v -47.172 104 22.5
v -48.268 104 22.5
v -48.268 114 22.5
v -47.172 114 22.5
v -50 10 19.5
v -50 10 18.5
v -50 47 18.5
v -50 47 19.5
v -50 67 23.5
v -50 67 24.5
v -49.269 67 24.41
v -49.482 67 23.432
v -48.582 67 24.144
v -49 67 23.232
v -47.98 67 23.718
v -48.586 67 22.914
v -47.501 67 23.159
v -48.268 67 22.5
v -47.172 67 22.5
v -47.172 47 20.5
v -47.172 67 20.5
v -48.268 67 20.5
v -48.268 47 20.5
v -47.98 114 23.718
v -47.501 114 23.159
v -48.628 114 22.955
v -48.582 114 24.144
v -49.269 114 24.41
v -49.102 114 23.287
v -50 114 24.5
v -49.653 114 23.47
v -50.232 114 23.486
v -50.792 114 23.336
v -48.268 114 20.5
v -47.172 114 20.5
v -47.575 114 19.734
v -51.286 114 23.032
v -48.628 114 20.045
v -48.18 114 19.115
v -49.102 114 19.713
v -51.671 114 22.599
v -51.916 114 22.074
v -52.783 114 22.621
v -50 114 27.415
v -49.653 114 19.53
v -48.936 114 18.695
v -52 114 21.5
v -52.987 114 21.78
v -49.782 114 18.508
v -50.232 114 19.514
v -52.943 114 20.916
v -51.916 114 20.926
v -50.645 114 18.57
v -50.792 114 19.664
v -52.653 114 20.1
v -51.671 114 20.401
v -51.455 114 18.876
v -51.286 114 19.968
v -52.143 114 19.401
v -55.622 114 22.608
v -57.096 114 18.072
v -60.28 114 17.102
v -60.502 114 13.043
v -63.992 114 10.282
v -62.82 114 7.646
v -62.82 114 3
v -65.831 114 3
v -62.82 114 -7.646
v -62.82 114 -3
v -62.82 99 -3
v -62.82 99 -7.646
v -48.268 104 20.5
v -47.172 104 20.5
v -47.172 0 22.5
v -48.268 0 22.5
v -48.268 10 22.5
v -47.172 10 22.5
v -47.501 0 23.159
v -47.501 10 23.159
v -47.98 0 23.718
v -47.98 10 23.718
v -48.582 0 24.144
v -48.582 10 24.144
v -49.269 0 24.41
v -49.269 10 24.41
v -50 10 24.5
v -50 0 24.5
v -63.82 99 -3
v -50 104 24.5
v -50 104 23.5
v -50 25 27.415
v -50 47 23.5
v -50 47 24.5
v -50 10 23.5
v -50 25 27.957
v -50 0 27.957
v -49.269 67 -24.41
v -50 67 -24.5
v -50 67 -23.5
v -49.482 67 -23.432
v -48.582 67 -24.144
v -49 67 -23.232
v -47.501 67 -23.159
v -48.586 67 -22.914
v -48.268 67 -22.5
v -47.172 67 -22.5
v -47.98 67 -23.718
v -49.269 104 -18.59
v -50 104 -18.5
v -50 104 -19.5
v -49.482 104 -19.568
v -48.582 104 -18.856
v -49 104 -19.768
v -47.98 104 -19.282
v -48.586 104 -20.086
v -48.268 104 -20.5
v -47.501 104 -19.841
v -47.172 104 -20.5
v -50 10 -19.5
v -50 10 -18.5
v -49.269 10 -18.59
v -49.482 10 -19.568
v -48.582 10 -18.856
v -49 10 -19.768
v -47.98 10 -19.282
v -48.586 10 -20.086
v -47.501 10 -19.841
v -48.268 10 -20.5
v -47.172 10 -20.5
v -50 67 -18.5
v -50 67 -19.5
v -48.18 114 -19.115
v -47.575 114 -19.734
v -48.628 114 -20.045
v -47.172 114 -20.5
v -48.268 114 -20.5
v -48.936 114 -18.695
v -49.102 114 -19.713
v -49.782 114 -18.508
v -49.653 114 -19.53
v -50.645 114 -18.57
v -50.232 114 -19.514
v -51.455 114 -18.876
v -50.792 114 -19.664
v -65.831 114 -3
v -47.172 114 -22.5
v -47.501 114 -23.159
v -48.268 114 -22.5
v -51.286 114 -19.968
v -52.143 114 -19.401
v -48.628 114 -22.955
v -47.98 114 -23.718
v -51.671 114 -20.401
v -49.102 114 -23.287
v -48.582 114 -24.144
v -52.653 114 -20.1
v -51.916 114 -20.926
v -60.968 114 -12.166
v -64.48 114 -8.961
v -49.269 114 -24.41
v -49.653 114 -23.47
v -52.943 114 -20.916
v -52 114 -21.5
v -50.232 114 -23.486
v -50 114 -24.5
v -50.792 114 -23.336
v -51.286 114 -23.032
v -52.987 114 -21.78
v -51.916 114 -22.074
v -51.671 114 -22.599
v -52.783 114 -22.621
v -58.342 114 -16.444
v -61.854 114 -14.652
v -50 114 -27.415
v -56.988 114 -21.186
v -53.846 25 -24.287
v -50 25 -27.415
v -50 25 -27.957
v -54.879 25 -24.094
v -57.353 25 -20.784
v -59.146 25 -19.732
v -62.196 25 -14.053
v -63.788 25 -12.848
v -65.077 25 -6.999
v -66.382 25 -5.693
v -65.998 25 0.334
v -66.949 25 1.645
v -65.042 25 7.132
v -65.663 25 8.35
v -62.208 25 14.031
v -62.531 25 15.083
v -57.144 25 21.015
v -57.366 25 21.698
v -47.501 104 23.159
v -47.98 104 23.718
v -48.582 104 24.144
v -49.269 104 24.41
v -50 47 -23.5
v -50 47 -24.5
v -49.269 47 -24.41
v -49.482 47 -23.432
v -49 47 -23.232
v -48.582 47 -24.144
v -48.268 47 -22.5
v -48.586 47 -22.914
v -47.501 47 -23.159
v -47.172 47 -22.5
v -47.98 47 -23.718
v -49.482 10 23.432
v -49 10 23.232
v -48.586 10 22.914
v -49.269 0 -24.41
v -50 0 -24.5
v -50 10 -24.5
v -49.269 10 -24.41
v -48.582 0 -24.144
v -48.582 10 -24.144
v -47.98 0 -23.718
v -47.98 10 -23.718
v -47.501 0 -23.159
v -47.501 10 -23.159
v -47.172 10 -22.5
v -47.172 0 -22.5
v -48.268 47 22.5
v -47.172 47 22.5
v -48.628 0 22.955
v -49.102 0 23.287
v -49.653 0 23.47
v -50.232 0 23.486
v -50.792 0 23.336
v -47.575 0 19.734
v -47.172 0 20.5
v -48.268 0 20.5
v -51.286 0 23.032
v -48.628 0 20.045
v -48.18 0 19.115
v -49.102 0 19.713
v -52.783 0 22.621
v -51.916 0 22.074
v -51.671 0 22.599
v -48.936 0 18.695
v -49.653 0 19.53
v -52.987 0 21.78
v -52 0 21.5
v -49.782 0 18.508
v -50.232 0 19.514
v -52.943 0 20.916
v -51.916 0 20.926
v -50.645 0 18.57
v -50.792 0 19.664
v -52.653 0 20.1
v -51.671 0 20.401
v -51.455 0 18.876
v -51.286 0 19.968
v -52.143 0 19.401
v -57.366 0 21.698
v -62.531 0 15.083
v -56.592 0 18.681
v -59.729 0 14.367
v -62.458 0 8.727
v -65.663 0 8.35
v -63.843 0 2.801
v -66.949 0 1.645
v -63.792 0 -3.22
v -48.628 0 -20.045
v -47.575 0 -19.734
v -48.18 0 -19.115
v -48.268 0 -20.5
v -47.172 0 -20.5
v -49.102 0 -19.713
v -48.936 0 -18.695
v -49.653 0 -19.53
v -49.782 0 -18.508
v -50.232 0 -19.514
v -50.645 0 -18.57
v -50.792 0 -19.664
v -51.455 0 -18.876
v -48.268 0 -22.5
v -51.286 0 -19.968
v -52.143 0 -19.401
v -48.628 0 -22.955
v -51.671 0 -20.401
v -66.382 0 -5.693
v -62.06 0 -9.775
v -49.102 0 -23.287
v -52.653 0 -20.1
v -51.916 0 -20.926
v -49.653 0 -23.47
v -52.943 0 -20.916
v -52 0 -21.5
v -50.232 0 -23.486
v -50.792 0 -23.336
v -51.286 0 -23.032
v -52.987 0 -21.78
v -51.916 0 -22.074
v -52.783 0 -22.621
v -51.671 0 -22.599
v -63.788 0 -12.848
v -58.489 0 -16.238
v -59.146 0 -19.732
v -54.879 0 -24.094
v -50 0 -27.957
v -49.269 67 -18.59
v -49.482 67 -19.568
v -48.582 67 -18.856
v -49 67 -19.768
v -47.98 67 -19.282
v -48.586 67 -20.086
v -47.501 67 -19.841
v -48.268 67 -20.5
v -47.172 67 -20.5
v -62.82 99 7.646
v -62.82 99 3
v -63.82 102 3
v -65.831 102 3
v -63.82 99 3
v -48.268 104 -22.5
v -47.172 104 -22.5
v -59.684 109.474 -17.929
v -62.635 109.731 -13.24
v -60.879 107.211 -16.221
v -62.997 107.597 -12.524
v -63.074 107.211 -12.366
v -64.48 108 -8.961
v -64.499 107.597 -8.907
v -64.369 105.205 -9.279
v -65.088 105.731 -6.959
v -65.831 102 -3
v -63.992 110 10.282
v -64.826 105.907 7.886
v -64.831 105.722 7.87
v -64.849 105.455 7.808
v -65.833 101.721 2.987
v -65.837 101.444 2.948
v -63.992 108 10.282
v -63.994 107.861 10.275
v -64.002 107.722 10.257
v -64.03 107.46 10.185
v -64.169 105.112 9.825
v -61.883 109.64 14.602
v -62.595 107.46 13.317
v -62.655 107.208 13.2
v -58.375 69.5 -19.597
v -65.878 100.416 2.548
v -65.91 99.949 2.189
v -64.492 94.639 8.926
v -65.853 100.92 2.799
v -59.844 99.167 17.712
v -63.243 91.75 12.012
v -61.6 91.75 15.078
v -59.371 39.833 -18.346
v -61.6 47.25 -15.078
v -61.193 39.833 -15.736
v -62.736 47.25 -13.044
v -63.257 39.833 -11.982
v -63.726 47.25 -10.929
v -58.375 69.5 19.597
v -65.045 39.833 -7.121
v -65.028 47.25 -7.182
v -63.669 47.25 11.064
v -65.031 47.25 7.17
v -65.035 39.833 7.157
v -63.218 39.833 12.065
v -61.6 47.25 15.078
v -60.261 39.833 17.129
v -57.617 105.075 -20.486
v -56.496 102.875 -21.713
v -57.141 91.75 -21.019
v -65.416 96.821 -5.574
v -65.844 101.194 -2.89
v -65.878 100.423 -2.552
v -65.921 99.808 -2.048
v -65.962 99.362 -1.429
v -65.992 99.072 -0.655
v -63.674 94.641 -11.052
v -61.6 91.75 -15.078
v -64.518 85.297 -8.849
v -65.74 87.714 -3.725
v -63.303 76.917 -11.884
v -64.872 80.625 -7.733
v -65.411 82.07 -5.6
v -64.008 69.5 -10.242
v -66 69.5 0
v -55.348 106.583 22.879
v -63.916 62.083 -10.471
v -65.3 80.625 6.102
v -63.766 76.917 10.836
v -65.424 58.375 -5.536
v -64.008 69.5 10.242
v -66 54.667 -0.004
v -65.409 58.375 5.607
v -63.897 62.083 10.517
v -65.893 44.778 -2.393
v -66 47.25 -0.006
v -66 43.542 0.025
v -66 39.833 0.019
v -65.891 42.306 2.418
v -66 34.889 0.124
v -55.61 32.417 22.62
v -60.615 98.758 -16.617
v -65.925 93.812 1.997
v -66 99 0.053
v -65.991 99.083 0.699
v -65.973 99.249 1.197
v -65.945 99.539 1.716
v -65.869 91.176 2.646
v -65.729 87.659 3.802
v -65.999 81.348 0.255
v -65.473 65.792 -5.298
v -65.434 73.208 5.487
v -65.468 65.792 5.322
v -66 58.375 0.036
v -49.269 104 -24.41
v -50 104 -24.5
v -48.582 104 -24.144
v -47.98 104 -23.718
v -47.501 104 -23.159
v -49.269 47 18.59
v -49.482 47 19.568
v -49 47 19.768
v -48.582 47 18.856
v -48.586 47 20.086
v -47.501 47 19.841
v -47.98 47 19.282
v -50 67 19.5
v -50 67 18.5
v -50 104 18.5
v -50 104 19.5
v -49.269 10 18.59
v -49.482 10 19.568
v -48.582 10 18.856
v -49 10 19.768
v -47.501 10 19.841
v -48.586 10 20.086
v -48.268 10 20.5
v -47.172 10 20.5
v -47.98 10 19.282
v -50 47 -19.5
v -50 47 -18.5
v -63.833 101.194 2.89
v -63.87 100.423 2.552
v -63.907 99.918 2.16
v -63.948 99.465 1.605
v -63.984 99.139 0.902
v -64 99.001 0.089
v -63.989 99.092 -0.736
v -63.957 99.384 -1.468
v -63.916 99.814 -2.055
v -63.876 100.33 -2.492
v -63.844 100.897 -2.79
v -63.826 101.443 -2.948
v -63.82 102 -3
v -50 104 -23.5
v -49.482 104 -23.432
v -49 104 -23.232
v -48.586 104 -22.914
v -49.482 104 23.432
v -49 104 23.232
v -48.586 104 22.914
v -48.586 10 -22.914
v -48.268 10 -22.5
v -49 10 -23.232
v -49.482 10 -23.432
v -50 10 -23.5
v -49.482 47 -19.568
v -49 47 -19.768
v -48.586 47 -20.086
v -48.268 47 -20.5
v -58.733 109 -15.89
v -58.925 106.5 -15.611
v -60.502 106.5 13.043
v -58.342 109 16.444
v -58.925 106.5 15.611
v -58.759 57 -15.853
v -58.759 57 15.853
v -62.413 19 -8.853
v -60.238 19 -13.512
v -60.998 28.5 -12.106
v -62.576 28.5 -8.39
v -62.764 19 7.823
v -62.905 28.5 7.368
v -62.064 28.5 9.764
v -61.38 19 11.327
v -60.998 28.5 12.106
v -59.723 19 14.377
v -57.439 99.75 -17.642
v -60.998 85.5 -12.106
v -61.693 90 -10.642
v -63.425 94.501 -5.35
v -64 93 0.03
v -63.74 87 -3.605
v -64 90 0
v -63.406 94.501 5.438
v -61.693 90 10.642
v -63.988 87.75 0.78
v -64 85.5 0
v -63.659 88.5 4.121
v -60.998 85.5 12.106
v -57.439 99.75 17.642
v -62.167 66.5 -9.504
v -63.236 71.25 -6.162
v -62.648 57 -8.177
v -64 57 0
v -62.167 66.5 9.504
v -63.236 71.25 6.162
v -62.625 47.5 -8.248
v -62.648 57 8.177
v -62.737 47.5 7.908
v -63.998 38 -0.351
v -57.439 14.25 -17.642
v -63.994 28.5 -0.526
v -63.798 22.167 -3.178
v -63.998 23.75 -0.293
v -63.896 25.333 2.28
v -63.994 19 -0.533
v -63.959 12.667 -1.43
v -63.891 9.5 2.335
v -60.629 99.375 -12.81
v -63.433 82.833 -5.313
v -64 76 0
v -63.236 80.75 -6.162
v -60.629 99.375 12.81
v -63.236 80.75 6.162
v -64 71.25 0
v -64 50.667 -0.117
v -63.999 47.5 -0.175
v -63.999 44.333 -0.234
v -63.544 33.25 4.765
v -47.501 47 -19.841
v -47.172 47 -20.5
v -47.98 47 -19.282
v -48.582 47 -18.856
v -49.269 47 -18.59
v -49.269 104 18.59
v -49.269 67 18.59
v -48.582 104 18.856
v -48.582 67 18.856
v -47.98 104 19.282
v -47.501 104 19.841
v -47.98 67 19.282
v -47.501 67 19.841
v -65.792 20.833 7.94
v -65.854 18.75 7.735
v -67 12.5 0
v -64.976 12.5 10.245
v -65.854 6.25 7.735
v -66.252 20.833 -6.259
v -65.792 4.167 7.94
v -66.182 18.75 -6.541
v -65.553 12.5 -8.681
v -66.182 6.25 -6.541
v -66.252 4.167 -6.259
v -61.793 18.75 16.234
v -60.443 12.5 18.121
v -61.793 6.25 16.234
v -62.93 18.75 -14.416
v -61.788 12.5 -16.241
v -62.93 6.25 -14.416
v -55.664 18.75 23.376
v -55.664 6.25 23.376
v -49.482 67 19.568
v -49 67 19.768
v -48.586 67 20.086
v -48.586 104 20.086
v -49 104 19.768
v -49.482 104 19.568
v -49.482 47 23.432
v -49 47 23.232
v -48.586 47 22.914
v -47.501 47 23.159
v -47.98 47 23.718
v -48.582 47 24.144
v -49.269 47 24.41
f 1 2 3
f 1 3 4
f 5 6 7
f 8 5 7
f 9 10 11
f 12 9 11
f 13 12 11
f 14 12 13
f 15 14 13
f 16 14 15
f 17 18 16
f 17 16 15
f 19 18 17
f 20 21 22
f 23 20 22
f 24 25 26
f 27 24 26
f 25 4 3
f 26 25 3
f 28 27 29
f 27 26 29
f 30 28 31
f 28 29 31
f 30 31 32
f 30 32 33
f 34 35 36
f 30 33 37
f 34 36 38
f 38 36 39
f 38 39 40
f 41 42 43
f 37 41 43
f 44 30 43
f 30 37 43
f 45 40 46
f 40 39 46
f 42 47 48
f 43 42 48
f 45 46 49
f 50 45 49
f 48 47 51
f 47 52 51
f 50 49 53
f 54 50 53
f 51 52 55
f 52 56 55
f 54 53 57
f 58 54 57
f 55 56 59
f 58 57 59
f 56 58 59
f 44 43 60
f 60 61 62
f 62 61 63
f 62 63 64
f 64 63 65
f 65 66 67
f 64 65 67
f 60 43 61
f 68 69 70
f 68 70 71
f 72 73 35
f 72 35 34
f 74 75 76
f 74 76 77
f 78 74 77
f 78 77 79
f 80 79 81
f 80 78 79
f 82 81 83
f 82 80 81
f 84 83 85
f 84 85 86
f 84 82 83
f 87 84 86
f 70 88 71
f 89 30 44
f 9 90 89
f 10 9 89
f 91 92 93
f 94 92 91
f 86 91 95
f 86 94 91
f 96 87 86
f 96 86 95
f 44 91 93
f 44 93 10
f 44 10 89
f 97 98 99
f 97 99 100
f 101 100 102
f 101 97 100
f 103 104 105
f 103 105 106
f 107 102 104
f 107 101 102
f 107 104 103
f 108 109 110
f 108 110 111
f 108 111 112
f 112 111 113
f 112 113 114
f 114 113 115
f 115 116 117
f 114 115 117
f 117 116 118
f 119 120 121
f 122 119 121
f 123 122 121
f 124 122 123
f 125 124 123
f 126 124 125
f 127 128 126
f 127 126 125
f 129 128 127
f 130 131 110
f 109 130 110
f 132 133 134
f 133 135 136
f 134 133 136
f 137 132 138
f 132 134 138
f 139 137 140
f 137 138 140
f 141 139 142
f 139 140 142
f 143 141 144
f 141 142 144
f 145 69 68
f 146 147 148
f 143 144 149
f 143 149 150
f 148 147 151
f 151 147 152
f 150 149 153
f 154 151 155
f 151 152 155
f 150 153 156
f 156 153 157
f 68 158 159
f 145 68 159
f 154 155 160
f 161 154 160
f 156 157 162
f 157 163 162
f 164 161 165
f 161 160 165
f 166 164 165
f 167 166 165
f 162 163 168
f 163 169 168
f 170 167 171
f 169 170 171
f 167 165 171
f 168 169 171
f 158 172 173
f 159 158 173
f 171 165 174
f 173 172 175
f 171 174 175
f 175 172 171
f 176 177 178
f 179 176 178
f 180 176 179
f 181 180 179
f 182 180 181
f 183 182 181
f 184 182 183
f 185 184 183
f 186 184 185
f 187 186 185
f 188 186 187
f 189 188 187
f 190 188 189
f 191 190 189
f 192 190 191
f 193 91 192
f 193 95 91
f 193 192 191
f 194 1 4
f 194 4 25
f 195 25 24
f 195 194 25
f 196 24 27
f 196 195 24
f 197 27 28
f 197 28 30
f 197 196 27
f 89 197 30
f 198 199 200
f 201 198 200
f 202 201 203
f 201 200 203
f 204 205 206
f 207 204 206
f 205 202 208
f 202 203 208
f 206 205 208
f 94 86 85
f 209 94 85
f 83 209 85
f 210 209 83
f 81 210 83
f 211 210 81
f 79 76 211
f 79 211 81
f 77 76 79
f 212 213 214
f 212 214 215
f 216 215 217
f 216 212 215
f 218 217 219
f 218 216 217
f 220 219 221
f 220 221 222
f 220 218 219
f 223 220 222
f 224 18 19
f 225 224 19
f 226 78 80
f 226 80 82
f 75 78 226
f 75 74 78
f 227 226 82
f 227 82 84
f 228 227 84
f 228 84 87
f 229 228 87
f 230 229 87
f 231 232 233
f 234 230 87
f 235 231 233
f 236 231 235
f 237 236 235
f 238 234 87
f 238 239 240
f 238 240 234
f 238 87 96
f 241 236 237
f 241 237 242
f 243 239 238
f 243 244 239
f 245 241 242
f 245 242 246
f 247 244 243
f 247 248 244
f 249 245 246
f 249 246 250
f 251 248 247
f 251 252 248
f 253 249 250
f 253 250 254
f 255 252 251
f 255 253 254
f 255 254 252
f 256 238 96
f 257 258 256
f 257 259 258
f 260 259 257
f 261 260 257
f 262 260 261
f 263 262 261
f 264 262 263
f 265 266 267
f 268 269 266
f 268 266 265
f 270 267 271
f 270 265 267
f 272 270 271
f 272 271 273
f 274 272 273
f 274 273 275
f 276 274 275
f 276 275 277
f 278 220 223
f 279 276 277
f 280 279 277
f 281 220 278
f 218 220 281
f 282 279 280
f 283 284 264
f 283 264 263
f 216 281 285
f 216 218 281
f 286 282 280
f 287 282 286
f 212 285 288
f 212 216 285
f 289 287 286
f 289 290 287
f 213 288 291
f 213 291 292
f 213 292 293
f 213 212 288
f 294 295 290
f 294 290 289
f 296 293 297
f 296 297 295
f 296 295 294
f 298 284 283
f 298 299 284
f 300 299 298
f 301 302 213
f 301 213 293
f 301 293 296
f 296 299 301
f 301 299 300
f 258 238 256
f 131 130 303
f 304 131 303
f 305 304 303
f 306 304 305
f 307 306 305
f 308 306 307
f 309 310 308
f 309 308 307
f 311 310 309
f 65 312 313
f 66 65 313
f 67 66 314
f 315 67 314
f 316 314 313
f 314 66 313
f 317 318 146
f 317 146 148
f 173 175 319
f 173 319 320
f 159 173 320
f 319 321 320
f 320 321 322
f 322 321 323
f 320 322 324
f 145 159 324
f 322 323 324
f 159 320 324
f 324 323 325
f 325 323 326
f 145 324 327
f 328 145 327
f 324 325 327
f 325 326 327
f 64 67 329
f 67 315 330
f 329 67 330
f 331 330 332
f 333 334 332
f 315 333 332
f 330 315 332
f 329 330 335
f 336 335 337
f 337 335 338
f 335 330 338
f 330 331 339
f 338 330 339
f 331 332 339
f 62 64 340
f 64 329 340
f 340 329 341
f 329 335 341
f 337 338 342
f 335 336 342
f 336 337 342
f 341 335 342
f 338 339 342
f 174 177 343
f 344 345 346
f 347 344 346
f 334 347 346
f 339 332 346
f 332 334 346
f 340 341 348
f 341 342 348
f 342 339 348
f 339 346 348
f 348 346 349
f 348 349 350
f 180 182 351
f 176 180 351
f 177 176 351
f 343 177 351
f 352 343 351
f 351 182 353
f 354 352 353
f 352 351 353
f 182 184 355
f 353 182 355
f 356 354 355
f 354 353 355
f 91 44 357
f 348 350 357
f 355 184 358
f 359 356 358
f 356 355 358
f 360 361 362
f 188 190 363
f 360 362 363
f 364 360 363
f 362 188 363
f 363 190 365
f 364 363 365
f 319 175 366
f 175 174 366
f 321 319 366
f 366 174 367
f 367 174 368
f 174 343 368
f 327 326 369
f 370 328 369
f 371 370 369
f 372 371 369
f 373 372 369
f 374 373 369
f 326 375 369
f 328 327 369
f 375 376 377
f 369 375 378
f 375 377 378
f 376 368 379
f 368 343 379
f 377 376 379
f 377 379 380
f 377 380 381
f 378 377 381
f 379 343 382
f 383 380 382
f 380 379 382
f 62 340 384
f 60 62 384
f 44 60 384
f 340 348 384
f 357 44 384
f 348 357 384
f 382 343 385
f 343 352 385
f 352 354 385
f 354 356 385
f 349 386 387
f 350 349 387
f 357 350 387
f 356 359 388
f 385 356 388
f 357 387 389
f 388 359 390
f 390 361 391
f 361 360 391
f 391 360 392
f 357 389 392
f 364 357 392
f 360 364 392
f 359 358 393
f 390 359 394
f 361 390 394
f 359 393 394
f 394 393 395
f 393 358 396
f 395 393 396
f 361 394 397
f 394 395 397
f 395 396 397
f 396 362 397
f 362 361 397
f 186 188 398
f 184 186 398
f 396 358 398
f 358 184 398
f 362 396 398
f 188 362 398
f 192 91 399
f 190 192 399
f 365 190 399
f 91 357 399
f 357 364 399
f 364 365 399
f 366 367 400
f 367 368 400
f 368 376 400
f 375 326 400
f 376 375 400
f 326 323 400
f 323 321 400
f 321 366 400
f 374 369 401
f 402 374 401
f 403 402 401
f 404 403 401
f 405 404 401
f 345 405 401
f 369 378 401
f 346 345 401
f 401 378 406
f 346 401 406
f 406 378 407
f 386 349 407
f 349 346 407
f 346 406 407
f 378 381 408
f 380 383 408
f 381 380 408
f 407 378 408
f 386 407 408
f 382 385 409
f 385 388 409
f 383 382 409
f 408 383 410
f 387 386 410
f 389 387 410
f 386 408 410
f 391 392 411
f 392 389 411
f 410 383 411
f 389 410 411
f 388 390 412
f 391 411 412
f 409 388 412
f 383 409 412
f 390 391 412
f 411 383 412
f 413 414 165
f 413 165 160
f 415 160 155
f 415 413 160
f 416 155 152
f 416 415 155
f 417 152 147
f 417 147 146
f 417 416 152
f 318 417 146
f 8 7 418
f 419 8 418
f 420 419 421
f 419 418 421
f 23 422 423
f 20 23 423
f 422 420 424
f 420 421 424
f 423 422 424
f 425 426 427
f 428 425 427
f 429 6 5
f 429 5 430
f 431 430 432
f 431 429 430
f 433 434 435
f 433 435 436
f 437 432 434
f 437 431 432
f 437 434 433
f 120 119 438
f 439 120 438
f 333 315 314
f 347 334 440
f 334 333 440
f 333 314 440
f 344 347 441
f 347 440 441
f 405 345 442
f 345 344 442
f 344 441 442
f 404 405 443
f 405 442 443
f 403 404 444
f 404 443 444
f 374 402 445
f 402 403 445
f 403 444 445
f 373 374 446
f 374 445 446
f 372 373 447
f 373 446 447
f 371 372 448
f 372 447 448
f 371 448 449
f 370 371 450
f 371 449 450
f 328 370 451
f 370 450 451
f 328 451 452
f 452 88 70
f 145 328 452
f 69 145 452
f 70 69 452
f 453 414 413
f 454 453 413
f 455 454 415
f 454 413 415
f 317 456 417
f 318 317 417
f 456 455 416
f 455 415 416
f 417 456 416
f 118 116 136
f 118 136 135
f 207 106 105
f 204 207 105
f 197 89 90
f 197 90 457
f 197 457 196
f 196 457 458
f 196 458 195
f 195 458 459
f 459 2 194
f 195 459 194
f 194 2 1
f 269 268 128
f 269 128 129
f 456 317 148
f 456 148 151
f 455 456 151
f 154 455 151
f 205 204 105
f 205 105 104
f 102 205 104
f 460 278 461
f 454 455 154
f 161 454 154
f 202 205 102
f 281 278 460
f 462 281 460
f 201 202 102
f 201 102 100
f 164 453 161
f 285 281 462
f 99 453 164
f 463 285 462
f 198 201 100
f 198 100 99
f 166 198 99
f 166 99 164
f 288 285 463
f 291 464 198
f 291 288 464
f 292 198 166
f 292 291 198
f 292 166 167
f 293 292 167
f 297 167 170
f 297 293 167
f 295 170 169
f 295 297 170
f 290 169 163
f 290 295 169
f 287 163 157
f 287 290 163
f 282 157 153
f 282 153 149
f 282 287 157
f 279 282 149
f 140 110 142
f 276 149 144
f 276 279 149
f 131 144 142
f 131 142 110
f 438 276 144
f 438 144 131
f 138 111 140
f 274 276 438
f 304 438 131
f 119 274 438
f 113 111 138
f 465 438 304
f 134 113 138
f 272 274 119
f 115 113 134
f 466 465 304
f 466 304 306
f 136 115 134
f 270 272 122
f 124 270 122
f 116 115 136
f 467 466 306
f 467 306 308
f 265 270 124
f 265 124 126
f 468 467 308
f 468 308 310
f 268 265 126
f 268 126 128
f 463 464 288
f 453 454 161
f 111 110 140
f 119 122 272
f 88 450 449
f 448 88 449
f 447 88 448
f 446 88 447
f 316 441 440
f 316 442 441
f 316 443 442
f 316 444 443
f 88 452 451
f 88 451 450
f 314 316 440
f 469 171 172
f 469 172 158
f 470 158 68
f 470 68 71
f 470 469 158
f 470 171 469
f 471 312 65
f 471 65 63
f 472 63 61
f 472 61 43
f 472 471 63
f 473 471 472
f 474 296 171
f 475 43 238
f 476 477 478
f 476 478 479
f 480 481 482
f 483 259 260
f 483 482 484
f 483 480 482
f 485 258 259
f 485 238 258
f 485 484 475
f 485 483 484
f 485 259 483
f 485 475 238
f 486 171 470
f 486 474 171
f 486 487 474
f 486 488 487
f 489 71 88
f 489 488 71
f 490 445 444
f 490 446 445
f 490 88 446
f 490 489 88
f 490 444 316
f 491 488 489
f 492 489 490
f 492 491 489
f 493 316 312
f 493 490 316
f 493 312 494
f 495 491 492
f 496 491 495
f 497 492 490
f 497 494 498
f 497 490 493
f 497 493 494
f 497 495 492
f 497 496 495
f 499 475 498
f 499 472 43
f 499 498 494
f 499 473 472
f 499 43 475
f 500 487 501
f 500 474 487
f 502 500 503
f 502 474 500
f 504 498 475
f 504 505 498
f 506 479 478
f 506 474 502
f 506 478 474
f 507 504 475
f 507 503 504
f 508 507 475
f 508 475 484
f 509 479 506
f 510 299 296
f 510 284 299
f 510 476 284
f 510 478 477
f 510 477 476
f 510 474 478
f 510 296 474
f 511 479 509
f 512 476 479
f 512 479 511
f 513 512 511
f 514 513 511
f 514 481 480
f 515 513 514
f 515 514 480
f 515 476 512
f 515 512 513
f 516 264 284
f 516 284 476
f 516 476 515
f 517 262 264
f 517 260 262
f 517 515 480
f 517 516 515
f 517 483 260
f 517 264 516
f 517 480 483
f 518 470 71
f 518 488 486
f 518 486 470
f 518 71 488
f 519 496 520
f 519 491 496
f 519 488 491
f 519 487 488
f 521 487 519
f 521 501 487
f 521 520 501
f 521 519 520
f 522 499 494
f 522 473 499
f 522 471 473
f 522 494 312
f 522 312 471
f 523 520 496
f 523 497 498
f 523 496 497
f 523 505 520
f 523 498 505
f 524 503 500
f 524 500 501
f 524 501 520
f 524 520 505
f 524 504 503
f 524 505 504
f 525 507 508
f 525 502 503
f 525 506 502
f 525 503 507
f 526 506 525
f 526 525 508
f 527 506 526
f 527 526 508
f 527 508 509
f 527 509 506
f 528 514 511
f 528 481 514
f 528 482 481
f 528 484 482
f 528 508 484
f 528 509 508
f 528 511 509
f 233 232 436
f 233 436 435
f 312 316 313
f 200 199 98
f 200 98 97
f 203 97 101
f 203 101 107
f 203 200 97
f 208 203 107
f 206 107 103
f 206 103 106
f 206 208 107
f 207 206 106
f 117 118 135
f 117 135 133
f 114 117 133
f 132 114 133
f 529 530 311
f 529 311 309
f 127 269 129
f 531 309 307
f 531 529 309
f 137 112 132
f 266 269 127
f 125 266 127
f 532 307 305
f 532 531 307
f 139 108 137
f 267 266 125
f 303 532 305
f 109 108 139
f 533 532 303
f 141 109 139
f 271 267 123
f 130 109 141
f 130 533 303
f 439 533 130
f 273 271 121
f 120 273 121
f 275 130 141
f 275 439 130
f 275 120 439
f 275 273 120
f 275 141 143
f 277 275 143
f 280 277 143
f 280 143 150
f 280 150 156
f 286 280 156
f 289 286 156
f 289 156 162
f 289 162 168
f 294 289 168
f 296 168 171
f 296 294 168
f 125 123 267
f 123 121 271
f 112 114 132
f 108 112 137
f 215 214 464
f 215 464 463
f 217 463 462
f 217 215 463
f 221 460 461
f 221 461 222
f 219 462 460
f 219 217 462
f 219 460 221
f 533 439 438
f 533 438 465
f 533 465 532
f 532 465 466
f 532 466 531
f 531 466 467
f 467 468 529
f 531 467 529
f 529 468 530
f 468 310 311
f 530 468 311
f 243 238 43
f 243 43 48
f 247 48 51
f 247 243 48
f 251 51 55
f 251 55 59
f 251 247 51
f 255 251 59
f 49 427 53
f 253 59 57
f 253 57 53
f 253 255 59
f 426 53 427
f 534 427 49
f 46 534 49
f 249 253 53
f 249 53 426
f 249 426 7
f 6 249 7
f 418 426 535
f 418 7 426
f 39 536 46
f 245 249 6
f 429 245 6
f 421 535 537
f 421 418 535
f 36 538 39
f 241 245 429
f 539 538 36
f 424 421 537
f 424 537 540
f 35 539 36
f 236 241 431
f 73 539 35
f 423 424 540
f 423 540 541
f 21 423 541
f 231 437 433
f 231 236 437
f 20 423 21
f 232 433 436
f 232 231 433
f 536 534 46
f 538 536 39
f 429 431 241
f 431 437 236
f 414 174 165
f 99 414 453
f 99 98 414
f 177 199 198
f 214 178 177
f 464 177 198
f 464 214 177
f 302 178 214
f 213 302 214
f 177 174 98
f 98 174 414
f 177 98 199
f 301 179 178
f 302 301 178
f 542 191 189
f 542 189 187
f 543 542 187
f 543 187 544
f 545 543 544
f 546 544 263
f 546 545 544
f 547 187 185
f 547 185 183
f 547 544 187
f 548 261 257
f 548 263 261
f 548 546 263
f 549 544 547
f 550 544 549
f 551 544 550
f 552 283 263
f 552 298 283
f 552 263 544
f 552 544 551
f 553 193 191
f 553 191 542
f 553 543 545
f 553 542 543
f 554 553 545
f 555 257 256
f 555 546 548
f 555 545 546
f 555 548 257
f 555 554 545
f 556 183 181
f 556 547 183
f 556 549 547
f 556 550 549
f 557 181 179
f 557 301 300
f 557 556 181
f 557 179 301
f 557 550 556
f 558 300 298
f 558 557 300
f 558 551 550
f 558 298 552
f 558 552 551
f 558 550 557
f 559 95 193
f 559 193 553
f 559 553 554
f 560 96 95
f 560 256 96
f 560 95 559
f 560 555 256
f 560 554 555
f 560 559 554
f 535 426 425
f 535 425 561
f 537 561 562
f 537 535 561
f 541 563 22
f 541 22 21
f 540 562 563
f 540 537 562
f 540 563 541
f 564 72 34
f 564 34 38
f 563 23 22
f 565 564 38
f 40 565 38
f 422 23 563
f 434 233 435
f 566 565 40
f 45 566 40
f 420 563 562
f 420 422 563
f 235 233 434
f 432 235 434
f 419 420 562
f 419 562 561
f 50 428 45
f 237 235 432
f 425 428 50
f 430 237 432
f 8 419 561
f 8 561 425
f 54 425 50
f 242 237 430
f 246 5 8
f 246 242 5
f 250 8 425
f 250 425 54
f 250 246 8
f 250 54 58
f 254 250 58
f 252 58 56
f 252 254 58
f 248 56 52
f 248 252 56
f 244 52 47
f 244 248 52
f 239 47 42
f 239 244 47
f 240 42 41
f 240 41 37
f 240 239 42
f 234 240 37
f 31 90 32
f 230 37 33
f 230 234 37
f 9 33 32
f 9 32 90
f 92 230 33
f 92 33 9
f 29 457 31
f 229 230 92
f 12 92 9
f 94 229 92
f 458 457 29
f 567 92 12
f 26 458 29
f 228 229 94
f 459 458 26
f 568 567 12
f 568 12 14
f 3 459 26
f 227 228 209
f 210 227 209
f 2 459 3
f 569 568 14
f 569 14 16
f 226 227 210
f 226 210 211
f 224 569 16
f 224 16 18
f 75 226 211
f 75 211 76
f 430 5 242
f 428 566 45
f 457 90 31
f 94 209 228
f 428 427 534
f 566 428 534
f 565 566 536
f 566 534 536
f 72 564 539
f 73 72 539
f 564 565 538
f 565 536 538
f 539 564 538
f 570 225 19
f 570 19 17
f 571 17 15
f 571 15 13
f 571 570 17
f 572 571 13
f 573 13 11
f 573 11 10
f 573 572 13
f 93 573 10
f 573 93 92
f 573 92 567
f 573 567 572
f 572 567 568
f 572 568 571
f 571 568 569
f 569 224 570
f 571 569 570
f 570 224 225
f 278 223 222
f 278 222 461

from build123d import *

# Parameters (mm, degrees)
EXTRUDE_1_DEPTH          = 114
EXTRUDE_2_DEPTH          = 25
CUT_EXTRUDE_1_DEPTH      = 136.153981133
SKETCH_4_W               = 1
SKETCH_4_H               = 5
EXTRUDE_3_DEPTH          = 15
CUT_EXTRUDE_2_DEPTH      = 136.153981133
CUT_EXTRUDE_2_DEPTH_BACK = 136.153981133
SKETCH_5_W               = 9.764805651
SKETCH_5_H               = 37


with BuildPart() as part:
    # 草图1 → 凸台-拉伸1 (new body)
    with BuildSketch(Plane(origin=(0, 0, 0), x_dir=(1, 0, 0), z_dir=(0, 1, 0))):
        with BuildLine():
            Line((-50, 27.415384473), (-50, 24.5))
            ThreePointArc((-50, 24.5), (-48.267949192, 23.949489743), (-47.171572875, 22.5))
            Line((-47.171572875, 22.5), (-48.267949192, 22.5))
            ThreePointArc((-48.267949192, 22.5), (-52, 21.5), (-48.267949192, 20.5))
            Line((-48.267949192, 20.5), (-47.171572875, 20.5))
            ThreePointArc((-47.171572875, 20.5), (-51.060822526, 18.693818329), (-52.782628461, 22.62115068))
            add(Edge.make_bspline(
                [(-52.782628461, 22.62115068), (-77.601288898, 0), (-52.782628461, -22.62115068)],
                knots=[5.682111054, 5.682111054, 5.682111054, 6.884259561, 6.884259561, 6.884259561], degree=2, weights=[1, 0.82472857, 1]))
            ThreePointArc((-52.782628461, -22.62115068), (-51.060822526, -18.693818329), (-47.171572875, -20.5))
            Line((-47.171572875, -20.5), (-48.267949192, -20.5))
            ThreePointArc((-48.267949192, -20.5), (-52, -21.5), (-48.267949192, -22.5))
            Line((-48.267949192, -22.5), (-47.171572875, -22.5))
            ThreePointArc((-47.171572875, -22.5), (-48.267949192, -23.949489743), (-50, -24.5))
            Line((-50, -24.5), (-50, -27.415384473))
            add(Edge.make_bspline(
                [(-50, 27.415384473), (-87.12, 0), (-50, -27.415384473)],
                knots=[2.430387488, 2.430387488, 2.430387488, 3.85279782, 3.85279782, 3.85279782], degree=2, weights=[1, 0.757575758, 1]))
        make_face()
    extrude(amount=EXTRUDE_1_DEPTH)

    # 草图2 → 凸台-拉伸2 (add)
    with BuildSketch(Plane.XZ):
        with BuildLine():
            Line((-50, -24.968730444), (-50, -27.95708451))
            add(Edge.make_bspline(
                [(-50, 27.95708451), (-89.78, 0), (-50, -27.95708451)],
                knots=[5.554827697, 5.554827697, 5.554827697, 7.011542917, 7.011542917, 7.011542917], degree=2, weights=[1, 0.746268657, 1]))
            Line((-50, 27.95708451), (-50, 24.968730444))
            add(Edge.make_bspline(
                [(-50, 24.968730444), (-81.92, 0), (-50, -24.968730444)],
                knots=[5.609054801, 5.609054801, 5.609054801, 6.957315814, 6.957315814, 6.957315814], degree=2, weights=[1, 0.78125, 1]))
        make_face()
    extrude(amount=-EXTRUDE_2_DEPTH)

    # 草图3 → 切除-拉伸1 (cut, through all)
    with BuildSketch(Plane(origin=(0, 0, 0), x_dir=(0, 0, -1), z_dir=(1, 0, 0))):
        with BuildLine():
            Line((3, 114), (-3, 114))
            Line((-3, 114), (-3, 102))
            ThreePointArc((-3, 102), (0, 99), (3, 102))
            Line((3, 102), (3, 114))
        make_face()
    extrude(amount=-CUT_EXTRUDE_1_DEPTH, mode=Mode.SUBTRACT)

    # 草图4 → 凸台-拉伸3 (add)
    with BuildSketch(Plane(origin=(0, 114, 0), x_dir=(1, 0, 0), z_dir=(0, 1, 0))):
        with Locations((-63.319746161, 5.5)):
            Rectangle(SKETCH_4_W, SKETCH_4_H)
        with Locations((-63.319746161, -5.5)):
            Rectangle(SKETCH_4_W, SKETCH_4_H)
    extrude(amount=-EXTRUDE_3_DEPTH)

    # 草图5 → 切除-拉伸2 (cut, two sides: drawn at the far end of the back side and taken through both)
    with BuildSketch(Plane.XY.offset(-CUT_EXTRUDE_2_DEPTH_BACK)):
        with Locations((-45.117597175, 85.5)):
            Rectangle(SKETCH_5_W, SKETCH_5_H)
        with Locations((-45.117597175, 28.5)):
            Rectangle(SKETCH_5_W, SKETCH_5_H)
    extrude(amount=CUT_EXTRUDE_2_DEPTH + CUT_EXTRUDE_2_DEPTH_BACK, mode=Mode.SUBTRACT)


solid = part.part
